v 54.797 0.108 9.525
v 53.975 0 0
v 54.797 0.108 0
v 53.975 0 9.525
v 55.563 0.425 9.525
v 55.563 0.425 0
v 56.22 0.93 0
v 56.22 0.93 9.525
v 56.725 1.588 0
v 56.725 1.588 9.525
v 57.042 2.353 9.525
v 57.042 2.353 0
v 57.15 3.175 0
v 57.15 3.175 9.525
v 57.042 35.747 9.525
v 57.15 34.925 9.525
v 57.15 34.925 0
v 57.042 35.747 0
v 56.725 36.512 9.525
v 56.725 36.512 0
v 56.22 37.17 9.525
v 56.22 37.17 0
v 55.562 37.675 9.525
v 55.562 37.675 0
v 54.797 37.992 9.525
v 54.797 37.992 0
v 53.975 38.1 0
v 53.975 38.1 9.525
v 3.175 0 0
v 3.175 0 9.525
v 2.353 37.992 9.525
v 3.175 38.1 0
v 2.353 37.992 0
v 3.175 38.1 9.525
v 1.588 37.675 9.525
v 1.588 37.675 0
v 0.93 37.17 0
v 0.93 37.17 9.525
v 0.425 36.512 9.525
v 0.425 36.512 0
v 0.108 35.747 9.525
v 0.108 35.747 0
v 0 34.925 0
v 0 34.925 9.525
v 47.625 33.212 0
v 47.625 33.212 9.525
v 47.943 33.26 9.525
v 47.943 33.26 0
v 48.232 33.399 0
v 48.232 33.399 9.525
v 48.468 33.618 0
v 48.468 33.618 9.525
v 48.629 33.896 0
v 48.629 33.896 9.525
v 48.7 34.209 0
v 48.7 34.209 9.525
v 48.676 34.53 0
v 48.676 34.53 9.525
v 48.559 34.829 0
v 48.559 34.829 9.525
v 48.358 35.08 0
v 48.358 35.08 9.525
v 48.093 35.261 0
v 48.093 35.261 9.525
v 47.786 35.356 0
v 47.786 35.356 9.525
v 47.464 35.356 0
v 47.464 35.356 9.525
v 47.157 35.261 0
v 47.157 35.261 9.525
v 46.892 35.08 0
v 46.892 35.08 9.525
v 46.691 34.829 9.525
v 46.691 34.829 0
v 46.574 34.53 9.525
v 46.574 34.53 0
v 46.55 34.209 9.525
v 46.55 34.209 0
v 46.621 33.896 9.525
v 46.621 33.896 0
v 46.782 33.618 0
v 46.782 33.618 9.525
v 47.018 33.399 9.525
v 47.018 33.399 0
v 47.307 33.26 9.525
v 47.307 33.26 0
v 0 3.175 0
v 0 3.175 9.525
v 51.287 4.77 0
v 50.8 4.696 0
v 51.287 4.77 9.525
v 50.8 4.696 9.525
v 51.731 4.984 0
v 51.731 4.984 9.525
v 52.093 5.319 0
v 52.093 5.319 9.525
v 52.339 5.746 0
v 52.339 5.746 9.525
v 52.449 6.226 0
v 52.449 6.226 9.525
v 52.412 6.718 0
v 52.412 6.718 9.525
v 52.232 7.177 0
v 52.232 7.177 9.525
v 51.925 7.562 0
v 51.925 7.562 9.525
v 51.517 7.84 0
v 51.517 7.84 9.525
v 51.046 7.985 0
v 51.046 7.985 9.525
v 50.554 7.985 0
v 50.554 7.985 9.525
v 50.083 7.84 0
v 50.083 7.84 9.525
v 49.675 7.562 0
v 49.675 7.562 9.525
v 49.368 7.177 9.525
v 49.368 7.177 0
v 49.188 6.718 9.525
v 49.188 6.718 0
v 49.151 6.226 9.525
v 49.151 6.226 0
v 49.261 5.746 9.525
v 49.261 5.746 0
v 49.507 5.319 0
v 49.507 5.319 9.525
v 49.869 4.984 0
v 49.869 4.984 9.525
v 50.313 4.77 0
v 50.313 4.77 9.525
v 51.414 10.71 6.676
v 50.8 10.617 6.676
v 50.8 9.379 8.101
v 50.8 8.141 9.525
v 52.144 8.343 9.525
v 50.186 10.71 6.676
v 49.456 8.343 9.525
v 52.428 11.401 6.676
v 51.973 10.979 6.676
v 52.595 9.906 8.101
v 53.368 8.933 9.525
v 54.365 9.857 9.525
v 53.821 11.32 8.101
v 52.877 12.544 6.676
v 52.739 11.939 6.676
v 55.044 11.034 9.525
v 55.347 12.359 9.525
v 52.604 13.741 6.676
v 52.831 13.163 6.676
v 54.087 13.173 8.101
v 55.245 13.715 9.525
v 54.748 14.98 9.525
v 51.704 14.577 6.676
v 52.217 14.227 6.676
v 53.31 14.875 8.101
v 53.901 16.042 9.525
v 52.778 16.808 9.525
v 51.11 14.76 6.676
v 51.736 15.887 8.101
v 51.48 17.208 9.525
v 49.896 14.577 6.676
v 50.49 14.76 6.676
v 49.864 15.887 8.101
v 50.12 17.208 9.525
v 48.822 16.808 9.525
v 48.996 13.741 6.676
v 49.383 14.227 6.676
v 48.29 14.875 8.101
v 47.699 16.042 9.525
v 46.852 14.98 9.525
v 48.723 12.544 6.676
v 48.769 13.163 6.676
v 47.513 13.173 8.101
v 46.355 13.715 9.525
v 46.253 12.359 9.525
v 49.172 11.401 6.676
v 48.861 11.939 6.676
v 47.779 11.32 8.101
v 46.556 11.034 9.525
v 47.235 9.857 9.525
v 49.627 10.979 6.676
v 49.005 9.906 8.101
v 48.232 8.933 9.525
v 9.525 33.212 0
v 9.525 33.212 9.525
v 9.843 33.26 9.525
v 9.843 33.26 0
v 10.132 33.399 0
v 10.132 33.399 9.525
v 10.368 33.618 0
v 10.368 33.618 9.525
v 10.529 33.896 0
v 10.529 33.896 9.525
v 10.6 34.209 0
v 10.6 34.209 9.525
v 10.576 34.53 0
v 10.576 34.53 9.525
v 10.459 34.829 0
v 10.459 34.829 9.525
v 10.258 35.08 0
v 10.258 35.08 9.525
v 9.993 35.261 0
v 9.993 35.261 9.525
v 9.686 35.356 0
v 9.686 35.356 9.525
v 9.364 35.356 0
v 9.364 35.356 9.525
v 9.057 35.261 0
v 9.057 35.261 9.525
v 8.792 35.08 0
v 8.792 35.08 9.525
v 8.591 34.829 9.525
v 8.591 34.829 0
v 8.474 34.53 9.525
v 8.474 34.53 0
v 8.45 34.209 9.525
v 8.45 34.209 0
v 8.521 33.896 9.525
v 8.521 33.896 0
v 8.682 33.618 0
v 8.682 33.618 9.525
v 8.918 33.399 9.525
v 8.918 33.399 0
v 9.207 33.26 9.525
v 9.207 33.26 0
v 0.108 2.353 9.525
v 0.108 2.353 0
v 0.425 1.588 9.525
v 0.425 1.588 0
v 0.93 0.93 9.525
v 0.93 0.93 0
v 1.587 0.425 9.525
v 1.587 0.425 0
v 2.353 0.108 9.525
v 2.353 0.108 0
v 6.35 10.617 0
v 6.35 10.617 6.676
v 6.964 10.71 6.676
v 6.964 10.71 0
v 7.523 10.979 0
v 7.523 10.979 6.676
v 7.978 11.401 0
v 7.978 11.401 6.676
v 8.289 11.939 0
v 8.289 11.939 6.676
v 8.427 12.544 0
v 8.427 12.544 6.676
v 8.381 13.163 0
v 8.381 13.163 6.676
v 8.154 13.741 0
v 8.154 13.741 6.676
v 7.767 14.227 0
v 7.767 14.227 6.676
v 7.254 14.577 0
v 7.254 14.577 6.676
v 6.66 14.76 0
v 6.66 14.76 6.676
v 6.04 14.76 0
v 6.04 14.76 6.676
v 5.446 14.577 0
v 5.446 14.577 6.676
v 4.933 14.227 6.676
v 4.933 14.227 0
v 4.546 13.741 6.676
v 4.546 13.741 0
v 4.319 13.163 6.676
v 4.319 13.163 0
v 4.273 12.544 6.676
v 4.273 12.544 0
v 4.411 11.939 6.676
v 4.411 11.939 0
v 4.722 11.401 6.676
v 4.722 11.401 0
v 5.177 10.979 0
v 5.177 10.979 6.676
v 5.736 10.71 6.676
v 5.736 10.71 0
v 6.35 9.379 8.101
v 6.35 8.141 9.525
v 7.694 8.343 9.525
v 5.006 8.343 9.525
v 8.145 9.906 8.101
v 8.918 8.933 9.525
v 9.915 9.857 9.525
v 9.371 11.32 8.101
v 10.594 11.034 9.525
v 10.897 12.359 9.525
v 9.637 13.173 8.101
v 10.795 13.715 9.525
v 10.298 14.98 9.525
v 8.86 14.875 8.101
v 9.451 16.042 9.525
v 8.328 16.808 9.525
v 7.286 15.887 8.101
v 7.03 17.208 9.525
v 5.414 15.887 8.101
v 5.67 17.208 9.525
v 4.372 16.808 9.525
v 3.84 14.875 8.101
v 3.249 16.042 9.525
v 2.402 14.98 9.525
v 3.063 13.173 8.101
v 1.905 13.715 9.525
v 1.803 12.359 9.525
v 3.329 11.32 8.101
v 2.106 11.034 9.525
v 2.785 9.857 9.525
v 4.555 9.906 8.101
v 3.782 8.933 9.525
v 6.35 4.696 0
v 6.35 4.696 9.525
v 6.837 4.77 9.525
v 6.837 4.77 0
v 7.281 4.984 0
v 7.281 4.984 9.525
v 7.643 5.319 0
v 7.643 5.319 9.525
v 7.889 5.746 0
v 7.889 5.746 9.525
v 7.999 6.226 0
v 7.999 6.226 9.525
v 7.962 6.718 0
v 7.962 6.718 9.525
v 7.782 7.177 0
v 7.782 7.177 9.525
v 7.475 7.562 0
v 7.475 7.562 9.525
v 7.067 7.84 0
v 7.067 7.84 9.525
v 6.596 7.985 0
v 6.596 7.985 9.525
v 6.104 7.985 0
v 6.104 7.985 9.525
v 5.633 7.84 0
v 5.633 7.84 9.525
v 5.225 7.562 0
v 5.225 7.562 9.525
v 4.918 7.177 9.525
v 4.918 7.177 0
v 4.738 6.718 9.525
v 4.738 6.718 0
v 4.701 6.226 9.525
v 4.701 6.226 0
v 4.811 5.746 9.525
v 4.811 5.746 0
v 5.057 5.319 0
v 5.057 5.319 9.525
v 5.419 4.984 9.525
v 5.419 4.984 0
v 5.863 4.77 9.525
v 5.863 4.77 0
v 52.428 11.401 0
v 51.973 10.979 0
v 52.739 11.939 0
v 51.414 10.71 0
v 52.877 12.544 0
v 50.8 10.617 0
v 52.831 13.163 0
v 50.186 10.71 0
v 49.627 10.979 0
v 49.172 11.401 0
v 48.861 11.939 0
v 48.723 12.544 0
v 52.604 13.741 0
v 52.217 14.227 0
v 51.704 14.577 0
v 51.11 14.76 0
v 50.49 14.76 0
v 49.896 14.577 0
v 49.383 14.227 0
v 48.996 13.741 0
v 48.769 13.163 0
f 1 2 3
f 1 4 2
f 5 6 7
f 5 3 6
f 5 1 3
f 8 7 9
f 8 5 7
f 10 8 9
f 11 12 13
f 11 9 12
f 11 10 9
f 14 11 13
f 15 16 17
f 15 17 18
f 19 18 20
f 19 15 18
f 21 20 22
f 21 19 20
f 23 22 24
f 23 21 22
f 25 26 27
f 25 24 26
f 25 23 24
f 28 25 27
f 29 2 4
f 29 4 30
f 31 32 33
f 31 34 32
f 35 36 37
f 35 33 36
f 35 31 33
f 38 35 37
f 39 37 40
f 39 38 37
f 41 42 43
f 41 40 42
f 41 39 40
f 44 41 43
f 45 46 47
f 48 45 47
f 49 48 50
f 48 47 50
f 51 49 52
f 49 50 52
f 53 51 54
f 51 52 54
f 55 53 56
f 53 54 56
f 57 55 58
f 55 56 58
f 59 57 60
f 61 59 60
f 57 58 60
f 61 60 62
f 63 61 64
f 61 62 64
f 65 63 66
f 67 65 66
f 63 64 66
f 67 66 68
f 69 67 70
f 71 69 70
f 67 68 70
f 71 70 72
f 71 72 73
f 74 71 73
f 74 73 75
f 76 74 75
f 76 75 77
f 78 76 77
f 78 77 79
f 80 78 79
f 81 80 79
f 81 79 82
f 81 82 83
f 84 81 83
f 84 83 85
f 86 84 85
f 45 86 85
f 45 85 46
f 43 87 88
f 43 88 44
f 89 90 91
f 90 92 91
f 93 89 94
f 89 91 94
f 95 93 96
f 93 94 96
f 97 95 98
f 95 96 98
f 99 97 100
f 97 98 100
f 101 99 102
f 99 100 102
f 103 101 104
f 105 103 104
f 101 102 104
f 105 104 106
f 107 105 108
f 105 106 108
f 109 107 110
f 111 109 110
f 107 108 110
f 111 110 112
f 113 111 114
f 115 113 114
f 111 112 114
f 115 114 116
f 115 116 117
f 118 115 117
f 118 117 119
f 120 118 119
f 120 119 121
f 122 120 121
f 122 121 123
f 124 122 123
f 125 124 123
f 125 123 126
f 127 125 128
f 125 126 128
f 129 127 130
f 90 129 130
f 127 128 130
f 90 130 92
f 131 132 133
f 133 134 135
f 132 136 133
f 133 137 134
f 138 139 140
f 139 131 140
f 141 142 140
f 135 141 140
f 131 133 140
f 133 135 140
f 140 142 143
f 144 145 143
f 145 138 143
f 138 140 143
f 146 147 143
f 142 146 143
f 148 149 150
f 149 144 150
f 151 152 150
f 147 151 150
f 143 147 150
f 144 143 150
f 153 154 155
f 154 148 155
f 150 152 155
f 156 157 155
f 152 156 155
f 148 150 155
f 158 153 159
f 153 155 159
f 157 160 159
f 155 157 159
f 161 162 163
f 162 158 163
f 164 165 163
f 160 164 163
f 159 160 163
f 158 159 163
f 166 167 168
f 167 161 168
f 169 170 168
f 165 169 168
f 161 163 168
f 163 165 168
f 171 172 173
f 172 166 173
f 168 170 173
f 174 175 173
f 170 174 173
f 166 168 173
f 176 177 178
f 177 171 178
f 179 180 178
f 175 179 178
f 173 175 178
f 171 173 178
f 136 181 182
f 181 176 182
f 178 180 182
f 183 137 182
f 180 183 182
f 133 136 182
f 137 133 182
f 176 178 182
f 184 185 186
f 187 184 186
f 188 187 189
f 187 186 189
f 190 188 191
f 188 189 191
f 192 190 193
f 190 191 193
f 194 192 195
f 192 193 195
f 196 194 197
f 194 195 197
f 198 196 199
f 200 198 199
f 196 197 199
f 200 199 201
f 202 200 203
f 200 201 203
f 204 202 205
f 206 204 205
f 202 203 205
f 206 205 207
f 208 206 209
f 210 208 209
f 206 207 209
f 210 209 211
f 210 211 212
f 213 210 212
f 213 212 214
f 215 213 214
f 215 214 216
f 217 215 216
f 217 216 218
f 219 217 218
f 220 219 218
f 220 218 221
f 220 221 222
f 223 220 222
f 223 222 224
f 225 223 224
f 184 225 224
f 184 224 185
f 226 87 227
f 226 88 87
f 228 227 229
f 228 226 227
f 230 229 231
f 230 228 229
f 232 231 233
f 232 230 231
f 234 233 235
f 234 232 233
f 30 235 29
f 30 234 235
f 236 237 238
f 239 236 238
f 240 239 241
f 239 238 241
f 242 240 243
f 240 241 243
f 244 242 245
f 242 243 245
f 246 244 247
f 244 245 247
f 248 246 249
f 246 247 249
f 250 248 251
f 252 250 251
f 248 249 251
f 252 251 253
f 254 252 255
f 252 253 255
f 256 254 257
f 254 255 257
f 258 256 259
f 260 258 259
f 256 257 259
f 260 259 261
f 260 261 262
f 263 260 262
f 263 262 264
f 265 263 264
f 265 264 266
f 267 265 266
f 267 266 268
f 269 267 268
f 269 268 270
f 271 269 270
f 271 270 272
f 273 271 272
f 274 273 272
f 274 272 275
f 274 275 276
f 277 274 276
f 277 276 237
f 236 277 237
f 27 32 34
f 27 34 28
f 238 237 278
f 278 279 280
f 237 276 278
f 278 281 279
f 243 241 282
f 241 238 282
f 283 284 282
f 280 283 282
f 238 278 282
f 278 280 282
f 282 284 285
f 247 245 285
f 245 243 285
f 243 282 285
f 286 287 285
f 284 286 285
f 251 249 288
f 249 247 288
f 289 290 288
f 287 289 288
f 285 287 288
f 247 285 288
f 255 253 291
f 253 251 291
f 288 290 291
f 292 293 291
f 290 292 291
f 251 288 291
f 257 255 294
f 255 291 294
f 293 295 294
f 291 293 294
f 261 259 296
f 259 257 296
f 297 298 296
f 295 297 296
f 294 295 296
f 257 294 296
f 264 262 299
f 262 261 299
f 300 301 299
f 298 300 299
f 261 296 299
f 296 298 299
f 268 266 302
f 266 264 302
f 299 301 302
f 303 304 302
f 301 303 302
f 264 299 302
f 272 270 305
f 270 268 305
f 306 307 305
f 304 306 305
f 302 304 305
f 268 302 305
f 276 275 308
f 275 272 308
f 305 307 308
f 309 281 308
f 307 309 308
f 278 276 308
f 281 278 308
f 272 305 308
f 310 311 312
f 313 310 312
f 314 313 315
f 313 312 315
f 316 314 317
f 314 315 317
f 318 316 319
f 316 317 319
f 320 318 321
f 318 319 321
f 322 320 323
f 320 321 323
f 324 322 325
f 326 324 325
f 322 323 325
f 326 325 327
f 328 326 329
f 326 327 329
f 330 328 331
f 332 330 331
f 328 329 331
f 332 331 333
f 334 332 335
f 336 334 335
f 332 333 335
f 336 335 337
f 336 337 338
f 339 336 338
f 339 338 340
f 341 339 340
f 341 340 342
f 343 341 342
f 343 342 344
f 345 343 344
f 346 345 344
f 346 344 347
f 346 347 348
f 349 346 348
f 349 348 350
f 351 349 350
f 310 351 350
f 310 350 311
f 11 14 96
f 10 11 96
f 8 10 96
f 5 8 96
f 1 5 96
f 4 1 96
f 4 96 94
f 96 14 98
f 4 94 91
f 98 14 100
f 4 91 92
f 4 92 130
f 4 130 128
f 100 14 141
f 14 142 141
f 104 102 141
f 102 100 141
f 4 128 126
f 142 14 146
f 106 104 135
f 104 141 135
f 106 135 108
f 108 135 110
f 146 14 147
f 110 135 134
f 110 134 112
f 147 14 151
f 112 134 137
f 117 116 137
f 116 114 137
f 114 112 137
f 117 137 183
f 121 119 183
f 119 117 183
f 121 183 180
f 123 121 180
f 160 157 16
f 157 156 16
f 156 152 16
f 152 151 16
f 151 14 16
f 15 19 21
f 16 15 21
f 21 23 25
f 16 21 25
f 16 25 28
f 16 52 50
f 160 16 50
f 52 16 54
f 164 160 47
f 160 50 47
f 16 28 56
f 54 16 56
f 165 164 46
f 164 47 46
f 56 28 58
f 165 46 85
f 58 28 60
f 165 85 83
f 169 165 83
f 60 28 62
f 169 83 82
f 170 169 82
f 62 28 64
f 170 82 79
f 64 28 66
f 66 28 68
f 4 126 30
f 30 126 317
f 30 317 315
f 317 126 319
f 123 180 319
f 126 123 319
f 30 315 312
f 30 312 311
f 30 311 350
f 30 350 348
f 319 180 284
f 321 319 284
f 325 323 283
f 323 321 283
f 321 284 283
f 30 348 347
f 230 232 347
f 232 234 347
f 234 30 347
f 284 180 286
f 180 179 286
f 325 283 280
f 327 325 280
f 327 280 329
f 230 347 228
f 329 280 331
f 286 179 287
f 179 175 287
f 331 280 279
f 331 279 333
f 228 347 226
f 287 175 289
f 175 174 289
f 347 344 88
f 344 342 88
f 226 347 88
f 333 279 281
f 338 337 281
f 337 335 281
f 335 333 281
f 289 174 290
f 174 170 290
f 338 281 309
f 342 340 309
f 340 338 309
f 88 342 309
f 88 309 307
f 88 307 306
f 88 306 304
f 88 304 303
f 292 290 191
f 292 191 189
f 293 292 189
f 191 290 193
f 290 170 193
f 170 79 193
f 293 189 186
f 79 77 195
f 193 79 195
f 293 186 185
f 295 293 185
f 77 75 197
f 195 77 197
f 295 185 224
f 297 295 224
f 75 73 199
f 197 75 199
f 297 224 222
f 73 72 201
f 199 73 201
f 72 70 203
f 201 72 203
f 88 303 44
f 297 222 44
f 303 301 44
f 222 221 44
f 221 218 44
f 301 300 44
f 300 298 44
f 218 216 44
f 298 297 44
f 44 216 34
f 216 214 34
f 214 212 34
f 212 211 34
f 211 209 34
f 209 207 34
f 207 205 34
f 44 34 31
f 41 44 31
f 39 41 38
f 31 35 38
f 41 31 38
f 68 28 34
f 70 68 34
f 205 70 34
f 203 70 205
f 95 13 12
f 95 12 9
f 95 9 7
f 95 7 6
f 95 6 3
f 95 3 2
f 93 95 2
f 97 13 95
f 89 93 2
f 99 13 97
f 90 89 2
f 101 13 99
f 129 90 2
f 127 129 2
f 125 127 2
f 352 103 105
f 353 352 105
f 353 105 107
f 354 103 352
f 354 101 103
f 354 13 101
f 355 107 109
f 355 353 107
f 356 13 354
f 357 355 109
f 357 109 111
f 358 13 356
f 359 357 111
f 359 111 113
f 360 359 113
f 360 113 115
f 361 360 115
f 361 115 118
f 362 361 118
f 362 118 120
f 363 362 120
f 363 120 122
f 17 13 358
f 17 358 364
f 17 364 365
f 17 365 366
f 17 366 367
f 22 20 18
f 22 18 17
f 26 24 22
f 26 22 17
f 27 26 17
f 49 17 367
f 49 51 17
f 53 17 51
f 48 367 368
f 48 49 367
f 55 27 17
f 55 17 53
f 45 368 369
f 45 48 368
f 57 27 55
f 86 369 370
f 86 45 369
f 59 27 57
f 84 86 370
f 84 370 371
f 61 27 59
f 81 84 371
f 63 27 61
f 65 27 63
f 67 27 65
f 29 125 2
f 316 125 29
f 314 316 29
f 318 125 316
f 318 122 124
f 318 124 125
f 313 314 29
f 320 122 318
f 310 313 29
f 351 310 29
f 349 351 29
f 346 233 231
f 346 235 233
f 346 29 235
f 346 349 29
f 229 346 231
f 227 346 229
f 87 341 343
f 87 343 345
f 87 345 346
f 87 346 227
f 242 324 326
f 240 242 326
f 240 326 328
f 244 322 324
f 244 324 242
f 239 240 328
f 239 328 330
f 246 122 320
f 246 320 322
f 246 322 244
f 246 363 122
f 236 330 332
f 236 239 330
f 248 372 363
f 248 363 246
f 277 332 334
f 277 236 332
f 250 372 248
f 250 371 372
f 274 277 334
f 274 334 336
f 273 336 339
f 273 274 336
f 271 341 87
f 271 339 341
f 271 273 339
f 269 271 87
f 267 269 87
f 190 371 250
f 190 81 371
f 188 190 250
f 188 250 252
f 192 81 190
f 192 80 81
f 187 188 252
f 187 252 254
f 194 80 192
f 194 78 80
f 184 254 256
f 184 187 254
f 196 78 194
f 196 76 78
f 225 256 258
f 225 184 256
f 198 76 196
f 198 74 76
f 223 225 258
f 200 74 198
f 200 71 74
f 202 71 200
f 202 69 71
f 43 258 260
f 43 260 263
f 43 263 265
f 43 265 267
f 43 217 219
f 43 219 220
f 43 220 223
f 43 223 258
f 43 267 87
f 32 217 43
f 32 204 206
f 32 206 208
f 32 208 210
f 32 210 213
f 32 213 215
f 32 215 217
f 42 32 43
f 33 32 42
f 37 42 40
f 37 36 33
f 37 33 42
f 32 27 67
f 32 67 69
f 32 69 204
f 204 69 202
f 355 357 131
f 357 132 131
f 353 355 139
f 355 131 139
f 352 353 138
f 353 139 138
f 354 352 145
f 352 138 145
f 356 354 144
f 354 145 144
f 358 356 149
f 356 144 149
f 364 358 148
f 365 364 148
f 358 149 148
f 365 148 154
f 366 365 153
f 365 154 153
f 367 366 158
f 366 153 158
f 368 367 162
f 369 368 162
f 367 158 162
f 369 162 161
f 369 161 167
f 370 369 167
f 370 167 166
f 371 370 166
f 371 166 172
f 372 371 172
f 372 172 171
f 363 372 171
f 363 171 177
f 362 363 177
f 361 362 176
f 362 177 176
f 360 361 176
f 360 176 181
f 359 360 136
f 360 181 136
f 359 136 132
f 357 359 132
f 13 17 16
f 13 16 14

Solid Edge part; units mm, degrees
sketch "Sketch1" plane through (0, 0, 0) normal (0, 0, 1) x (1, 0, 0)
  line L0 (0, 0) -> (0, 38.1)
  line L1 (0, 38.1) -> (57.15, 38.1)
  line L2 (57.15, 38.1) -> (57.15, 0)
  line L3 (57.15, 0) -> (0, 0)
  dimension "D1" = 38.1
  dimension "D2" = 57.15
extrude "Protrusion1" add sketch "Sketch1" along normal blind 9.525
fillet "Round_1" radius 3.175 4 edges at (0, 0, 4.7625) (0, 38.1, 4.7625) (57.15, 38.1, 4.7625) (57.15, 0, 4.7625)
hole "Hole_1" at (50.8, 12.7, 9.525) direction (0, 0, -1) diameter 4.1656 end up to next countersink diameter 9.1186 countersink angle 82
hole "Hole1" at (6.35, 12.7, 9.525) direction (0, 0, -1) diameter 4.1656 end up to next countersink diameter 9.1186 countersink angle 82
hole "Hole_3" at (47.625, 34.29, 9.525) direction (0, 0, -1) diameter 2.1565 end through all
hole "Hole2" at (9.525, 34.29, 9.525) direction (0, 0, -1) diameter 2.1565 end through all
hole "Hole_10" at (50.8, 6.35, 9.525) direction (0, 0, -1) diameter 3.3071 end up to next
hole "Hole3" at (6.35, 6.35, 9.525) direction (0, 0, -1) diameter 3.3071 end up to next
properties material "Polyethylene, low density"
